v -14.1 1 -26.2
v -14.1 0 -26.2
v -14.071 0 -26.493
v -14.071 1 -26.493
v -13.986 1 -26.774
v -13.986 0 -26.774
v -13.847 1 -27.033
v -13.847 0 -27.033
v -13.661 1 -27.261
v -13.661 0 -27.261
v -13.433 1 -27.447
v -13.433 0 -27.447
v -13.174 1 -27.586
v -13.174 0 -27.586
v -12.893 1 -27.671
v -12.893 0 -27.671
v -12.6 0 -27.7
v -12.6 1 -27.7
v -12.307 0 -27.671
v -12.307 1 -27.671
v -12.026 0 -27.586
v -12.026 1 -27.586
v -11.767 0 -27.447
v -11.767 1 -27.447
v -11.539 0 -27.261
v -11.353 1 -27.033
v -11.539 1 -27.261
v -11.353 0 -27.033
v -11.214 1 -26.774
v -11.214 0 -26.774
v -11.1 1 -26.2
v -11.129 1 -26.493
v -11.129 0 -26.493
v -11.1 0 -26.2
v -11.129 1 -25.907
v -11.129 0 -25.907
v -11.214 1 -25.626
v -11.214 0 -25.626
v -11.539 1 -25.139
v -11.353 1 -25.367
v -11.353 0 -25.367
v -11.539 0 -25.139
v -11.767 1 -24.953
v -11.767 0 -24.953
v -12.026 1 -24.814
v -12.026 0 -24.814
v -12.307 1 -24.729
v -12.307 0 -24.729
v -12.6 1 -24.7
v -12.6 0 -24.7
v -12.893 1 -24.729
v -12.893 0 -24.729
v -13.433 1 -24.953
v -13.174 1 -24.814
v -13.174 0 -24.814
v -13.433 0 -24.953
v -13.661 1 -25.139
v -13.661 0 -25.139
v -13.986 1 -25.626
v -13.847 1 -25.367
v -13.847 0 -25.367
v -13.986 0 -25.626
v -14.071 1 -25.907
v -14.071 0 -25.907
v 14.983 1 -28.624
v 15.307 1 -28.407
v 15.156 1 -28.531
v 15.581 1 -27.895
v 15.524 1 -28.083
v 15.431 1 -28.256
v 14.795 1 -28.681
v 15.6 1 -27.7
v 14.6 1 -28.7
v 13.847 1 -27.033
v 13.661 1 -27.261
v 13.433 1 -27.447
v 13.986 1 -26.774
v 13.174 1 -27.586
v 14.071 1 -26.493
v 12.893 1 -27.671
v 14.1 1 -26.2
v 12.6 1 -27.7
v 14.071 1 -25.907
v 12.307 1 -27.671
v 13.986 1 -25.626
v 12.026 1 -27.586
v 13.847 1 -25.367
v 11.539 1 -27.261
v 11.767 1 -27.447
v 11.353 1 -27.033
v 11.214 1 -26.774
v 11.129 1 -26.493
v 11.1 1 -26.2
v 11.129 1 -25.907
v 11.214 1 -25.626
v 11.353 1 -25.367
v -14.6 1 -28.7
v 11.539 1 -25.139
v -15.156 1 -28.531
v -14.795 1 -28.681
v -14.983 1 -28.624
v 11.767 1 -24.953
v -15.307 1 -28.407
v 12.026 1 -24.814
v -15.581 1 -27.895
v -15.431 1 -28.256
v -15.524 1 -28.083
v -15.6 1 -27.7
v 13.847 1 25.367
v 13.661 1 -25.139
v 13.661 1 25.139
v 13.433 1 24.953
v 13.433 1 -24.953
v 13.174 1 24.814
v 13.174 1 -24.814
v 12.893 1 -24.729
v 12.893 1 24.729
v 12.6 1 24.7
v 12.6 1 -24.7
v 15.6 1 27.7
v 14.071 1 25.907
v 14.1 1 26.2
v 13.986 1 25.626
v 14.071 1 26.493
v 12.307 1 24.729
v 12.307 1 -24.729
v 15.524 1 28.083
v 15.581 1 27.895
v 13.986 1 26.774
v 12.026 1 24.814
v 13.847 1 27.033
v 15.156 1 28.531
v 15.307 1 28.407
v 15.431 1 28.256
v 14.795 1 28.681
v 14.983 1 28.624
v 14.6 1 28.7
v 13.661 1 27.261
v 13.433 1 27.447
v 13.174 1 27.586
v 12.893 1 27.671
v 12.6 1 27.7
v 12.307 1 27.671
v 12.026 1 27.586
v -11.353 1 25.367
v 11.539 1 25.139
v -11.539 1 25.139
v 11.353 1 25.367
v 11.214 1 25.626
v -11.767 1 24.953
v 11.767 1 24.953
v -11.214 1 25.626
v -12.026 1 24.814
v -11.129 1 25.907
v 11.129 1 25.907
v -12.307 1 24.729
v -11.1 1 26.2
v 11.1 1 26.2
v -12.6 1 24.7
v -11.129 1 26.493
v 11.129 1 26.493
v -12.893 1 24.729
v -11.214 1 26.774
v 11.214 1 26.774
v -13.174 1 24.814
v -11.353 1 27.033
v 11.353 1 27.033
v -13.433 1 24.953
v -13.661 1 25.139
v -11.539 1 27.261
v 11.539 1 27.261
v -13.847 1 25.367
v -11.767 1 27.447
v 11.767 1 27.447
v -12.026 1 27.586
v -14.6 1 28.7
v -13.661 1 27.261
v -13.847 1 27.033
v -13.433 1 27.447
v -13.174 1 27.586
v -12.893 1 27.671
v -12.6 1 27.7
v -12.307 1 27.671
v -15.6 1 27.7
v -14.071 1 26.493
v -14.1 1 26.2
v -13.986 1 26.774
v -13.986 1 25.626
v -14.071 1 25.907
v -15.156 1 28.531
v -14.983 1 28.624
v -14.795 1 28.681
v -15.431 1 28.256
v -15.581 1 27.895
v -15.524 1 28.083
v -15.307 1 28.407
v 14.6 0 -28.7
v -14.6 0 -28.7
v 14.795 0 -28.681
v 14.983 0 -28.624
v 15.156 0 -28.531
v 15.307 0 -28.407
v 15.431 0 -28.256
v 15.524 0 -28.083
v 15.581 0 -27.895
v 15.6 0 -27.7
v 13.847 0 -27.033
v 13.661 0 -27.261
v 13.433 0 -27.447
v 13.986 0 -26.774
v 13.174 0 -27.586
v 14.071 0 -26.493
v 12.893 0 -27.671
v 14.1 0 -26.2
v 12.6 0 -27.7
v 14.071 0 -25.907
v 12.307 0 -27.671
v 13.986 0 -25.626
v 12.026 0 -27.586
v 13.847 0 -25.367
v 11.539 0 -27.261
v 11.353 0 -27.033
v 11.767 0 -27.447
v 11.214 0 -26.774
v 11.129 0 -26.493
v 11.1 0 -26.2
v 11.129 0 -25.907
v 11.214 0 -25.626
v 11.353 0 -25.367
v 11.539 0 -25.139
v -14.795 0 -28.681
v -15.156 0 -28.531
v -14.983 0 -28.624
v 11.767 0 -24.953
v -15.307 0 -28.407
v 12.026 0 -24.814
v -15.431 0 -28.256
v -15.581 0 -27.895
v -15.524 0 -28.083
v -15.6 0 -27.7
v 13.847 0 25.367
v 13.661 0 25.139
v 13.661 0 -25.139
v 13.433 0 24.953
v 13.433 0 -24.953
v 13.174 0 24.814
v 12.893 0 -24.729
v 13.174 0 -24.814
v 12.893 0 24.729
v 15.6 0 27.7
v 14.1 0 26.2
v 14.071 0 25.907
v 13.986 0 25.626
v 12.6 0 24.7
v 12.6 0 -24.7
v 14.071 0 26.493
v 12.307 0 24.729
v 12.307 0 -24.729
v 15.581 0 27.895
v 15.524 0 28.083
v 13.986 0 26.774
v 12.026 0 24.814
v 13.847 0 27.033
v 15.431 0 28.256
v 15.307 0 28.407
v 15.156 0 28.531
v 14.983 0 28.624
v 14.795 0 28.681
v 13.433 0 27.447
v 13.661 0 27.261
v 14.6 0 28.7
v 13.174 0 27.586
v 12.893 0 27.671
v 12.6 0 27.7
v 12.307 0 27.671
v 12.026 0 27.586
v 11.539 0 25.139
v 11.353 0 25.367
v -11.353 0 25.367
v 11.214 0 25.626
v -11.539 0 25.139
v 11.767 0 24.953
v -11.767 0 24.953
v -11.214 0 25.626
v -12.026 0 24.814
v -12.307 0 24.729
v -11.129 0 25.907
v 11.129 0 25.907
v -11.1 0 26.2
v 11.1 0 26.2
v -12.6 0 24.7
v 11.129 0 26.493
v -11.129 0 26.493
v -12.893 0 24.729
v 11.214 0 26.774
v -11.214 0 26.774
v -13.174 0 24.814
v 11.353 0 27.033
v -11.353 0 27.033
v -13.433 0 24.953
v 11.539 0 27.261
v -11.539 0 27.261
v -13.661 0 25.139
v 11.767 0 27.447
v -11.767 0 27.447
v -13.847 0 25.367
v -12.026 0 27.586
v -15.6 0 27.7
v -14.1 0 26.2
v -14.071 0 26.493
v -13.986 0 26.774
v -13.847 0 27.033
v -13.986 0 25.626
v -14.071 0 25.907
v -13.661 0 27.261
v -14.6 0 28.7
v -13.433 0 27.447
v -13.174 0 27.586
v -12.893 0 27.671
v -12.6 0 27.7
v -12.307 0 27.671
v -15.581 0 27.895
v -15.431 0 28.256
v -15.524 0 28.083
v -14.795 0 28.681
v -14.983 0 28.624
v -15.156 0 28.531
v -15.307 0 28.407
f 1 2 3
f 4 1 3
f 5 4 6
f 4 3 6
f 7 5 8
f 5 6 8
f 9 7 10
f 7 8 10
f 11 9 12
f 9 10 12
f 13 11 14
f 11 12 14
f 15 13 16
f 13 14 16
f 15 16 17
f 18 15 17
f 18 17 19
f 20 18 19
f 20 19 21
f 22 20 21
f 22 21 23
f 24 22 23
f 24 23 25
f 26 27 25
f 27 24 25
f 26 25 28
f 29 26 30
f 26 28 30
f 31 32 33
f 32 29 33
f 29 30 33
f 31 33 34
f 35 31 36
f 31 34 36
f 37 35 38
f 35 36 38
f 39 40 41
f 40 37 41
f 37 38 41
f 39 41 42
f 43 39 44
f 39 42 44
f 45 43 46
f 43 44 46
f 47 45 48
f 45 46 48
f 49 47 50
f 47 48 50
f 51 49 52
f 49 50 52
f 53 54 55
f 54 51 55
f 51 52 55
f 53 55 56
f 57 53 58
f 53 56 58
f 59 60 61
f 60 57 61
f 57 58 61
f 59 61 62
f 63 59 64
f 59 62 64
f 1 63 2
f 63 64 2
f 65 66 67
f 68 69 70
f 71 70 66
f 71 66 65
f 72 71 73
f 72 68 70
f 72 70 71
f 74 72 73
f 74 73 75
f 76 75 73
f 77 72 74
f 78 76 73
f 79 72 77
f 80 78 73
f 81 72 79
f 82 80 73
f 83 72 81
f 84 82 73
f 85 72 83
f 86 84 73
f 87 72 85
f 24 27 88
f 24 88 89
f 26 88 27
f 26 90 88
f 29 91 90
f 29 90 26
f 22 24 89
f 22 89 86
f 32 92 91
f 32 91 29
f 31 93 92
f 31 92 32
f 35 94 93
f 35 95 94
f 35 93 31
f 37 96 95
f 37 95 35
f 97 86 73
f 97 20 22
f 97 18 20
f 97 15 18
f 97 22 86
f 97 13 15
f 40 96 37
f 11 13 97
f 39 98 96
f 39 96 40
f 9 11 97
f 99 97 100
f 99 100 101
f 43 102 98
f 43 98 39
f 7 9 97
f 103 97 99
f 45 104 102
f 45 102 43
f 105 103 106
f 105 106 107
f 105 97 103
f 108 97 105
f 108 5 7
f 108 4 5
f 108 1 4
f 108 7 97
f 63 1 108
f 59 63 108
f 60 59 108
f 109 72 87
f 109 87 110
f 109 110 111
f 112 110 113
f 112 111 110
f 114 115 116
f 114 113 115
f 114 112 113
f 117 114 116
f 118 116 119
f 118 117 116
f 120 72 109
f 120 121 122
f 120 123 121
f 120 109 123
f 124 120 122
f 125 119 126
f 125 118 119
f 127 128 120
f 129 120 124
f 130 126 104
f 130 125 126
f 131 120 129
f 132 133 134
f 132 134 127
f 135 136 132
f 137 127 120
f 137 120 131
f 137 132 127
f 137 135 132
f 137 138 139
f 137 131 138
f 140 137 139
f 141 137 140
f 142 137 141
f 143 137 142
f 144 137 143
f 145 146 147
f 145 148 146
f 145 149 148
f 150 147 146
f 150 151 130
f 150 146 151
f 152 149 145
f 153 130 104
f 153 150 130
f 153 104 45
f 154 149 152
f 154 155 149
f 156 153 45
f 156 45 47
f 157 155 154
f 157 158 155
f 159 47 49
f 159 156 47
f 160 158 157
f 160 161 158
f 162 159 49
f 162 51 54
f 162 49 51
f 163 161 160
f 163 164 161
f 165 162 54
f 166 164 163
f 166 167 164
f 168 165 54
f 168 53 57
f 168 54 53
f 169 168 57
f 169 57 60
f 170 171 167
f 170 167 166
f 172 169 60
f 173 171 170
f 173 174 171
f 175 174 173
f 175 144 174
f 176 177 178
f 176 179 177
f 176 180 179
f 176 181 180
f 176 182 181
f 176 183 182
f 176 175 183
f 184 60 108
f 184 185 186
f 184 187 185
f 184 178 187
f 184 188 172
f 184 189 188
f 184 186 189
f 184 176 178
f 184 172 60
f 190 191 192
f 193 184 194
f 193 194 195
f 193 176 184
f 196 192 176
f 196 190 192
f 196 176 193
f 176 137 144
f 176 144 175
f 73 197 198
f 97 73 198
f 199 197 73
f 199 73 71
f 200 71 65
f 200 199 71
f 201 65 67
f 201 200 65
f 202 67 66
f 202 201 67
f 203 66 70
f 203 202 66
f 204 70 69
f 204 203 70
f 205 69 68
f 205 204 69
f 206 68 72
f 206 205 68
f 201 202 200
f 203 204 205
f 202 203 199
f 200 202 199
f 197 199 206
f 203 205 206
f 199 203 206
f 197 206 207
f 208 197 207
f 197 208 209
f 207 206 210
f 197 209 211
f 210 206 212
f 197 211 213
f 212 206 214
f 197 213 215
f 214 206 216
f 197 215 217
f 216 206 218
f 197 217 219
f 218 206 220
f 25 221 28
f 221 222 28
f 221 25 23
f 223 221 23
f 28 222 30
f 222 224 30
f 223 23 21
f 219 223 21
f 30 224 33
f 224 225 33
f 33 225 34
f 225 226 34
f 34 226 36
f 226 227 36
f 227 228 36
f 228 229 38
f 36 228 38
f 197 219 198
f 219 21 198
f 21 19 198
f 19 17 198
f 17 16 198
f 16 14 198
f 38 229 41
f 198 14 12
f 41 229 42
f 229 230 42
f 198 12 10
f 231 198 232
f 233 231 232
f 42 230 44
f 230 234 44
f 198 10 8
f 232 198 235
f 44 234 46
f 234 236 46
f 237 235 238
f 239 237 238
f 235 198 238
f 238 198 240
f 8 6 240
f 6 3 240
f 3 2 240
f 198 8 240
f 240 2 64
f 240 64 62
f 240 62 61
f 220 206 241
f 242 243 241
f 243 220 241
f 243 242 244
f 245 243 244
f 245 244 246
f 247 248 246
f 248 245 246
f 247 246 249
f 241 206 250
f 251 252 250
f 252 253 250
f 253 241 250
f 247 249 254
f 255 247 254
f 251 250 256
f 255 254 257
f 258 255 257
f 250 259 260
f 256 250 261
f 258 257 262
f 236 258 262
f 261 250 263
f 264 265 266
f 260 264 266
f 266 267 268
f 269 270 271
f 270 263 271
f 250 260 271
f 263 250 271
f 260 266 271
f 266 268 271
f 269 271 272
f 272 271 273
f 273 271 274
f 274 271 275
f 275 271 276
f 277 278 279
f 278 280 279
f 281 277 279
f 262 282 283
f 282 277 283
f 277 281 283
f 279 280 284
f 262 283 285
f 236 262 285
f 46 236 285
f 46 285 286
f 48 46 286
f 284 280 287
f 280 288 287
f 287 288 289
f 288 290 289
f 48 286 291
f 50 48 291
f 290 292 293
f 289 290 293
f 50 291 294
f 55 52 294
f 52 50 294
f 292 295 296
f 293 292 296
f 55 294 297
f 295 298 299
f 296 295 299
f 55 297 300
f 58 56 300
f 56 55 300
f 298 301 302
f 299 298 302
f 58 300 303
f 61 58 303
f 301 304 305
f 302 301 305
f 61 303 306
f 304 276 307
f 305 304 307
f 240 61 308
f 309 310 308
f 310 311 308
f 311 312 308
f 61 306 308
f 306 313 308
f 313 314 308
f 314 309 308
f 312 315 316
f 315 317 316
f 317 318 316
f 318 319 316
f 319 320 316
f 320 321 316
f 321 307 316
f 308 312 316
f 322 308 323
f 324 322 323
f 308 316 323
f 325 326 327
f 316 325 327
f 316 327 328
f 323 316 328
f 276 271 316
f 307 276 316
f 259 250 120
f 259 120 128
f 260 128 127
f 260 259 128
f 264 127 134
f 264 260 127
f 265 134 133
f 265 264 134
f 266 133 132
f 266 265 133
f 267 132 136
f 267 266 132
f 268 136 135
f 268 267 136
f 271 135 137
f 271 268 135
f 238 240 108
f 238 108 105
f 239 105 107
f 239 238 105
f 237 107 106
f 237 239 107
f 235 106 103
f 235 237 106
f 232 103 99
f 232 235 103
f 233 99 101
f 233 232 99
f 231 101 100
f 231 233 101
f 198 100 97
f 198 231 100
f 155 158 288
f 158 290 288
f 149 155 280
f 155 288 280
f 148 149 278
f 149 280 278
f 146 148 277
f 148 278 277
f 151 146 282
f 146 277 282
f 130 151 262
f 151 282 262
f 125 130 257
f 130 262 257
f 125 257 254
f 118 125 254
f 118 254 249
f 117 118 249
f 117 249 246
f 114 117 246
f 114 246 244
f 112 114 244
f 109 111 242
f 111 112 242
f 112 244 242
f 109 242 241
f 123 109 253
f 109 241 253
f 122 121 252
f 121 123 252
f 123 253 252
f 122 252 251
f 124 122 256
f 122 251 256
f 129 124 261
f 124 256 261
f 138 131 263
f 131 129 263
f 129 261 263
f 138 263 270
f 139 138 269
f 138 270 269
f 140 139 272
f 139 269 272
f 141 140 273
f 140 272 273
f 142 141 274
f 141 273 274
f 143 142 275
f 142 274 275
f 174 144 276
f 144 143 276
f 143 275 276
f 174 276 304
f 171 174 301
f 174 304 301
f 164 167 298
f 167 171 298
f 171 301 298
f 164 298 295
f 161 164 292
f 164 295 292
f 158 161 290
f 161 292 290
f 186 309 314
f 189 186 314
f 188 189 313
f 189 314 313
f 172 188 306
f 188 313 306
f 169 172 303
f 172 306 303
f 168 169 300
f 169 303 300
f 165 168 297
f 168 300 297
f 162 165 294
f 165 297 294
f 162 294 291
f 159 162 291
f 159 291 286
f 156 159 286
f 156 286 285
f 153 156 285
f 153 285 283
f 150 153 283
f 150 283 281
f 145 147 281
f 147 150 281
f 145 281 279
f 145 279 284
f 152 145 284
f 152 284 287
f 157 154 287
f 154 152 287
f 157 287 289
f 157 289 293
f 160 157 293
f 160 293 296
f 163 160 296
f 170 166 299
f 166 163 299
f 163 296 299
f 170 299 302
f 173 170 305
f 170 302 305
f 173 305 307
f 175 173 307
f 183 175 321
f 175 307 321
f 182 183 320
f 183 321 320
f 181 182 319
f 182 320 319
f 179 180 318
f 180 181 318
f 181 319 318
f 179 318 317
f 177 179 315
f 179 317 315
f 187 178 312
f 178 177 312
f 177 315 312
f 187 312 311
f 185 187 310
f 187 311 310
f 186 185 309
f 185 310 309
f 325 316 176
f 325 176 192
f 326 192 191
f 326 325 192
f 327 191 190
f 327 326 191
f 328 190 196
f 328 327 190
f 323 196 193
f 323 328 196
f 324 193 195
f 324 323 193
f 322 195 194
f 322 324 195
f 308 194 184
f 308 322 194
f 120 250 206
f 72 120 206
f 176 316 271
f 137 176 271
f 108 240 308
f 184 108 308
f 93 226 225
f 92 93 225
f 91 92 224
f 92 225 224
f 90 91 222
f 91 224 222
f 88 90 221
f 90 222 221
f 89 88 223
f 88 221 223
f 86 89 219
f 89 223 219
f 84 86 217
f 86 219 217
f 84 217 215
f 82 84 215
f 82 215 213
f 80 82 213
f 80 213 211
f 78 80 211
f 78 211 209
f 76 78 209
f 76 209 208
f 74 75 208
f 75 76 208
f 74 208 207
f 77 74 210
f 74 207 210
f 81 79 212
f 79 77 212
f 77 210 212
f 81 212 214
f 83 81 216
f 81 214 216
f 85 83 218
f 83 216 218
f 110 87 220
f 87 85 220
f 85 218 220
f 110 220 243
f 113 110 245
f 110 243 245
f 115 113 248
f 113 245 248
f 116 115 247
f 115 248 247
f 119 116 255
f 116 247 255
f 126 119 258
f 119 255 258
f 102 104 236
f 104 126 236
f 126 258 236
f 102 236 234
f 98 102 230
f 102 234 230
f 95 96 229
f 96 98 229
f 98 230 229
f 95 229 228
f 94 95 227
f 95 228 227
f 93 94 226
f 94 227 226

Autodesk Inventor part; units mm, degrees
ref_plane "YZ Plane" through (0, 0, 0) normal (1, 0, 0) x (0, 1, 0)
ref_plane "XZ Plane" through (0, 0, 0) normal (0, 1, 0) x (-1, 0, 0)
ref_plane "XY Plane" through (0, 0, 0) normal (0, 0, 1) x (1, 0, 0)
sketch "Sketch1" plane through (0, 0, 0) normal (0, 0, 1) x (1, 0, 0)
  point P0 (0, 0)
sketch "Sketch2" plane through (0, 0, 0) normal (0, 1, 0) x (-1, 0, 0)
  line L0 (14.6, 28.7) -> (-14.6, 28.7)
  line L1 (-15.6, 27.7) -> (-15.6, -27.7)
  line L2 (-14.6, -28.7) -> (14.6, -28.7)
  line L3 (15.6, -27.7) -> (15.6, 27.7)
  line L4 (15.6, 28.7) -> (-15.6, -28.7) construction
  line L5 (-15.6, 28.7) -> (15.6, -28.7) construction
  arc A0 (15.6, 27.7) -> (14.6, 28.7) centre (14.6, 27.7) ccw
  arc A1 (-14.6, 28.7) -> (-15.6, 27.7) centre (-14.6, 27.7) ccw
  arc A2 (14.6, -28.7) -> (15.6, -27.7) centre (14.6, -27.7) ccw
  arc A3 (-15.6, -27.7) -> (-14.6, -28.7) centre (-14.6, -27.7) ccw
  circle A4 centre (12.6, 26.2) radius 1.5
  line L6 (0, 28.7) -> (0, -28.7) construction
  line L7 (15.6, 0) -> (-15.6, 0) construction
  circle A5 centre (12.6, -26.2) radius 1.5
  circle A6 centre (-12.6, 26.2) radius 1.5
  circle A7 centre (-12.6, -26.2) radius 1.5
  line L8 (1.792, 7.3985) -> (1.792, -6.1335) construction
  line L9 (1.792, -6.1335) -> (-36.4686, -6.1335) construction
  line L10 (-36.4686, -6.1335) -> (-36.4686, 7.3985) construction
  line L11 (-36.4686, 7.3985) -> (1.792, 7.3985) construction
  point P0 (0, 0)
  dimension "d0" = 31.2
  dimension "d1" = 57.4
  dimension "d2" = 1
  dimension "d3" = 3
  dimension "d4" = 3
  dimension "d5" = 2.5
extrude "Extrusion1" add sketch "Sketch2" along normal blind 1
properties part number "esp8266_footprint"
